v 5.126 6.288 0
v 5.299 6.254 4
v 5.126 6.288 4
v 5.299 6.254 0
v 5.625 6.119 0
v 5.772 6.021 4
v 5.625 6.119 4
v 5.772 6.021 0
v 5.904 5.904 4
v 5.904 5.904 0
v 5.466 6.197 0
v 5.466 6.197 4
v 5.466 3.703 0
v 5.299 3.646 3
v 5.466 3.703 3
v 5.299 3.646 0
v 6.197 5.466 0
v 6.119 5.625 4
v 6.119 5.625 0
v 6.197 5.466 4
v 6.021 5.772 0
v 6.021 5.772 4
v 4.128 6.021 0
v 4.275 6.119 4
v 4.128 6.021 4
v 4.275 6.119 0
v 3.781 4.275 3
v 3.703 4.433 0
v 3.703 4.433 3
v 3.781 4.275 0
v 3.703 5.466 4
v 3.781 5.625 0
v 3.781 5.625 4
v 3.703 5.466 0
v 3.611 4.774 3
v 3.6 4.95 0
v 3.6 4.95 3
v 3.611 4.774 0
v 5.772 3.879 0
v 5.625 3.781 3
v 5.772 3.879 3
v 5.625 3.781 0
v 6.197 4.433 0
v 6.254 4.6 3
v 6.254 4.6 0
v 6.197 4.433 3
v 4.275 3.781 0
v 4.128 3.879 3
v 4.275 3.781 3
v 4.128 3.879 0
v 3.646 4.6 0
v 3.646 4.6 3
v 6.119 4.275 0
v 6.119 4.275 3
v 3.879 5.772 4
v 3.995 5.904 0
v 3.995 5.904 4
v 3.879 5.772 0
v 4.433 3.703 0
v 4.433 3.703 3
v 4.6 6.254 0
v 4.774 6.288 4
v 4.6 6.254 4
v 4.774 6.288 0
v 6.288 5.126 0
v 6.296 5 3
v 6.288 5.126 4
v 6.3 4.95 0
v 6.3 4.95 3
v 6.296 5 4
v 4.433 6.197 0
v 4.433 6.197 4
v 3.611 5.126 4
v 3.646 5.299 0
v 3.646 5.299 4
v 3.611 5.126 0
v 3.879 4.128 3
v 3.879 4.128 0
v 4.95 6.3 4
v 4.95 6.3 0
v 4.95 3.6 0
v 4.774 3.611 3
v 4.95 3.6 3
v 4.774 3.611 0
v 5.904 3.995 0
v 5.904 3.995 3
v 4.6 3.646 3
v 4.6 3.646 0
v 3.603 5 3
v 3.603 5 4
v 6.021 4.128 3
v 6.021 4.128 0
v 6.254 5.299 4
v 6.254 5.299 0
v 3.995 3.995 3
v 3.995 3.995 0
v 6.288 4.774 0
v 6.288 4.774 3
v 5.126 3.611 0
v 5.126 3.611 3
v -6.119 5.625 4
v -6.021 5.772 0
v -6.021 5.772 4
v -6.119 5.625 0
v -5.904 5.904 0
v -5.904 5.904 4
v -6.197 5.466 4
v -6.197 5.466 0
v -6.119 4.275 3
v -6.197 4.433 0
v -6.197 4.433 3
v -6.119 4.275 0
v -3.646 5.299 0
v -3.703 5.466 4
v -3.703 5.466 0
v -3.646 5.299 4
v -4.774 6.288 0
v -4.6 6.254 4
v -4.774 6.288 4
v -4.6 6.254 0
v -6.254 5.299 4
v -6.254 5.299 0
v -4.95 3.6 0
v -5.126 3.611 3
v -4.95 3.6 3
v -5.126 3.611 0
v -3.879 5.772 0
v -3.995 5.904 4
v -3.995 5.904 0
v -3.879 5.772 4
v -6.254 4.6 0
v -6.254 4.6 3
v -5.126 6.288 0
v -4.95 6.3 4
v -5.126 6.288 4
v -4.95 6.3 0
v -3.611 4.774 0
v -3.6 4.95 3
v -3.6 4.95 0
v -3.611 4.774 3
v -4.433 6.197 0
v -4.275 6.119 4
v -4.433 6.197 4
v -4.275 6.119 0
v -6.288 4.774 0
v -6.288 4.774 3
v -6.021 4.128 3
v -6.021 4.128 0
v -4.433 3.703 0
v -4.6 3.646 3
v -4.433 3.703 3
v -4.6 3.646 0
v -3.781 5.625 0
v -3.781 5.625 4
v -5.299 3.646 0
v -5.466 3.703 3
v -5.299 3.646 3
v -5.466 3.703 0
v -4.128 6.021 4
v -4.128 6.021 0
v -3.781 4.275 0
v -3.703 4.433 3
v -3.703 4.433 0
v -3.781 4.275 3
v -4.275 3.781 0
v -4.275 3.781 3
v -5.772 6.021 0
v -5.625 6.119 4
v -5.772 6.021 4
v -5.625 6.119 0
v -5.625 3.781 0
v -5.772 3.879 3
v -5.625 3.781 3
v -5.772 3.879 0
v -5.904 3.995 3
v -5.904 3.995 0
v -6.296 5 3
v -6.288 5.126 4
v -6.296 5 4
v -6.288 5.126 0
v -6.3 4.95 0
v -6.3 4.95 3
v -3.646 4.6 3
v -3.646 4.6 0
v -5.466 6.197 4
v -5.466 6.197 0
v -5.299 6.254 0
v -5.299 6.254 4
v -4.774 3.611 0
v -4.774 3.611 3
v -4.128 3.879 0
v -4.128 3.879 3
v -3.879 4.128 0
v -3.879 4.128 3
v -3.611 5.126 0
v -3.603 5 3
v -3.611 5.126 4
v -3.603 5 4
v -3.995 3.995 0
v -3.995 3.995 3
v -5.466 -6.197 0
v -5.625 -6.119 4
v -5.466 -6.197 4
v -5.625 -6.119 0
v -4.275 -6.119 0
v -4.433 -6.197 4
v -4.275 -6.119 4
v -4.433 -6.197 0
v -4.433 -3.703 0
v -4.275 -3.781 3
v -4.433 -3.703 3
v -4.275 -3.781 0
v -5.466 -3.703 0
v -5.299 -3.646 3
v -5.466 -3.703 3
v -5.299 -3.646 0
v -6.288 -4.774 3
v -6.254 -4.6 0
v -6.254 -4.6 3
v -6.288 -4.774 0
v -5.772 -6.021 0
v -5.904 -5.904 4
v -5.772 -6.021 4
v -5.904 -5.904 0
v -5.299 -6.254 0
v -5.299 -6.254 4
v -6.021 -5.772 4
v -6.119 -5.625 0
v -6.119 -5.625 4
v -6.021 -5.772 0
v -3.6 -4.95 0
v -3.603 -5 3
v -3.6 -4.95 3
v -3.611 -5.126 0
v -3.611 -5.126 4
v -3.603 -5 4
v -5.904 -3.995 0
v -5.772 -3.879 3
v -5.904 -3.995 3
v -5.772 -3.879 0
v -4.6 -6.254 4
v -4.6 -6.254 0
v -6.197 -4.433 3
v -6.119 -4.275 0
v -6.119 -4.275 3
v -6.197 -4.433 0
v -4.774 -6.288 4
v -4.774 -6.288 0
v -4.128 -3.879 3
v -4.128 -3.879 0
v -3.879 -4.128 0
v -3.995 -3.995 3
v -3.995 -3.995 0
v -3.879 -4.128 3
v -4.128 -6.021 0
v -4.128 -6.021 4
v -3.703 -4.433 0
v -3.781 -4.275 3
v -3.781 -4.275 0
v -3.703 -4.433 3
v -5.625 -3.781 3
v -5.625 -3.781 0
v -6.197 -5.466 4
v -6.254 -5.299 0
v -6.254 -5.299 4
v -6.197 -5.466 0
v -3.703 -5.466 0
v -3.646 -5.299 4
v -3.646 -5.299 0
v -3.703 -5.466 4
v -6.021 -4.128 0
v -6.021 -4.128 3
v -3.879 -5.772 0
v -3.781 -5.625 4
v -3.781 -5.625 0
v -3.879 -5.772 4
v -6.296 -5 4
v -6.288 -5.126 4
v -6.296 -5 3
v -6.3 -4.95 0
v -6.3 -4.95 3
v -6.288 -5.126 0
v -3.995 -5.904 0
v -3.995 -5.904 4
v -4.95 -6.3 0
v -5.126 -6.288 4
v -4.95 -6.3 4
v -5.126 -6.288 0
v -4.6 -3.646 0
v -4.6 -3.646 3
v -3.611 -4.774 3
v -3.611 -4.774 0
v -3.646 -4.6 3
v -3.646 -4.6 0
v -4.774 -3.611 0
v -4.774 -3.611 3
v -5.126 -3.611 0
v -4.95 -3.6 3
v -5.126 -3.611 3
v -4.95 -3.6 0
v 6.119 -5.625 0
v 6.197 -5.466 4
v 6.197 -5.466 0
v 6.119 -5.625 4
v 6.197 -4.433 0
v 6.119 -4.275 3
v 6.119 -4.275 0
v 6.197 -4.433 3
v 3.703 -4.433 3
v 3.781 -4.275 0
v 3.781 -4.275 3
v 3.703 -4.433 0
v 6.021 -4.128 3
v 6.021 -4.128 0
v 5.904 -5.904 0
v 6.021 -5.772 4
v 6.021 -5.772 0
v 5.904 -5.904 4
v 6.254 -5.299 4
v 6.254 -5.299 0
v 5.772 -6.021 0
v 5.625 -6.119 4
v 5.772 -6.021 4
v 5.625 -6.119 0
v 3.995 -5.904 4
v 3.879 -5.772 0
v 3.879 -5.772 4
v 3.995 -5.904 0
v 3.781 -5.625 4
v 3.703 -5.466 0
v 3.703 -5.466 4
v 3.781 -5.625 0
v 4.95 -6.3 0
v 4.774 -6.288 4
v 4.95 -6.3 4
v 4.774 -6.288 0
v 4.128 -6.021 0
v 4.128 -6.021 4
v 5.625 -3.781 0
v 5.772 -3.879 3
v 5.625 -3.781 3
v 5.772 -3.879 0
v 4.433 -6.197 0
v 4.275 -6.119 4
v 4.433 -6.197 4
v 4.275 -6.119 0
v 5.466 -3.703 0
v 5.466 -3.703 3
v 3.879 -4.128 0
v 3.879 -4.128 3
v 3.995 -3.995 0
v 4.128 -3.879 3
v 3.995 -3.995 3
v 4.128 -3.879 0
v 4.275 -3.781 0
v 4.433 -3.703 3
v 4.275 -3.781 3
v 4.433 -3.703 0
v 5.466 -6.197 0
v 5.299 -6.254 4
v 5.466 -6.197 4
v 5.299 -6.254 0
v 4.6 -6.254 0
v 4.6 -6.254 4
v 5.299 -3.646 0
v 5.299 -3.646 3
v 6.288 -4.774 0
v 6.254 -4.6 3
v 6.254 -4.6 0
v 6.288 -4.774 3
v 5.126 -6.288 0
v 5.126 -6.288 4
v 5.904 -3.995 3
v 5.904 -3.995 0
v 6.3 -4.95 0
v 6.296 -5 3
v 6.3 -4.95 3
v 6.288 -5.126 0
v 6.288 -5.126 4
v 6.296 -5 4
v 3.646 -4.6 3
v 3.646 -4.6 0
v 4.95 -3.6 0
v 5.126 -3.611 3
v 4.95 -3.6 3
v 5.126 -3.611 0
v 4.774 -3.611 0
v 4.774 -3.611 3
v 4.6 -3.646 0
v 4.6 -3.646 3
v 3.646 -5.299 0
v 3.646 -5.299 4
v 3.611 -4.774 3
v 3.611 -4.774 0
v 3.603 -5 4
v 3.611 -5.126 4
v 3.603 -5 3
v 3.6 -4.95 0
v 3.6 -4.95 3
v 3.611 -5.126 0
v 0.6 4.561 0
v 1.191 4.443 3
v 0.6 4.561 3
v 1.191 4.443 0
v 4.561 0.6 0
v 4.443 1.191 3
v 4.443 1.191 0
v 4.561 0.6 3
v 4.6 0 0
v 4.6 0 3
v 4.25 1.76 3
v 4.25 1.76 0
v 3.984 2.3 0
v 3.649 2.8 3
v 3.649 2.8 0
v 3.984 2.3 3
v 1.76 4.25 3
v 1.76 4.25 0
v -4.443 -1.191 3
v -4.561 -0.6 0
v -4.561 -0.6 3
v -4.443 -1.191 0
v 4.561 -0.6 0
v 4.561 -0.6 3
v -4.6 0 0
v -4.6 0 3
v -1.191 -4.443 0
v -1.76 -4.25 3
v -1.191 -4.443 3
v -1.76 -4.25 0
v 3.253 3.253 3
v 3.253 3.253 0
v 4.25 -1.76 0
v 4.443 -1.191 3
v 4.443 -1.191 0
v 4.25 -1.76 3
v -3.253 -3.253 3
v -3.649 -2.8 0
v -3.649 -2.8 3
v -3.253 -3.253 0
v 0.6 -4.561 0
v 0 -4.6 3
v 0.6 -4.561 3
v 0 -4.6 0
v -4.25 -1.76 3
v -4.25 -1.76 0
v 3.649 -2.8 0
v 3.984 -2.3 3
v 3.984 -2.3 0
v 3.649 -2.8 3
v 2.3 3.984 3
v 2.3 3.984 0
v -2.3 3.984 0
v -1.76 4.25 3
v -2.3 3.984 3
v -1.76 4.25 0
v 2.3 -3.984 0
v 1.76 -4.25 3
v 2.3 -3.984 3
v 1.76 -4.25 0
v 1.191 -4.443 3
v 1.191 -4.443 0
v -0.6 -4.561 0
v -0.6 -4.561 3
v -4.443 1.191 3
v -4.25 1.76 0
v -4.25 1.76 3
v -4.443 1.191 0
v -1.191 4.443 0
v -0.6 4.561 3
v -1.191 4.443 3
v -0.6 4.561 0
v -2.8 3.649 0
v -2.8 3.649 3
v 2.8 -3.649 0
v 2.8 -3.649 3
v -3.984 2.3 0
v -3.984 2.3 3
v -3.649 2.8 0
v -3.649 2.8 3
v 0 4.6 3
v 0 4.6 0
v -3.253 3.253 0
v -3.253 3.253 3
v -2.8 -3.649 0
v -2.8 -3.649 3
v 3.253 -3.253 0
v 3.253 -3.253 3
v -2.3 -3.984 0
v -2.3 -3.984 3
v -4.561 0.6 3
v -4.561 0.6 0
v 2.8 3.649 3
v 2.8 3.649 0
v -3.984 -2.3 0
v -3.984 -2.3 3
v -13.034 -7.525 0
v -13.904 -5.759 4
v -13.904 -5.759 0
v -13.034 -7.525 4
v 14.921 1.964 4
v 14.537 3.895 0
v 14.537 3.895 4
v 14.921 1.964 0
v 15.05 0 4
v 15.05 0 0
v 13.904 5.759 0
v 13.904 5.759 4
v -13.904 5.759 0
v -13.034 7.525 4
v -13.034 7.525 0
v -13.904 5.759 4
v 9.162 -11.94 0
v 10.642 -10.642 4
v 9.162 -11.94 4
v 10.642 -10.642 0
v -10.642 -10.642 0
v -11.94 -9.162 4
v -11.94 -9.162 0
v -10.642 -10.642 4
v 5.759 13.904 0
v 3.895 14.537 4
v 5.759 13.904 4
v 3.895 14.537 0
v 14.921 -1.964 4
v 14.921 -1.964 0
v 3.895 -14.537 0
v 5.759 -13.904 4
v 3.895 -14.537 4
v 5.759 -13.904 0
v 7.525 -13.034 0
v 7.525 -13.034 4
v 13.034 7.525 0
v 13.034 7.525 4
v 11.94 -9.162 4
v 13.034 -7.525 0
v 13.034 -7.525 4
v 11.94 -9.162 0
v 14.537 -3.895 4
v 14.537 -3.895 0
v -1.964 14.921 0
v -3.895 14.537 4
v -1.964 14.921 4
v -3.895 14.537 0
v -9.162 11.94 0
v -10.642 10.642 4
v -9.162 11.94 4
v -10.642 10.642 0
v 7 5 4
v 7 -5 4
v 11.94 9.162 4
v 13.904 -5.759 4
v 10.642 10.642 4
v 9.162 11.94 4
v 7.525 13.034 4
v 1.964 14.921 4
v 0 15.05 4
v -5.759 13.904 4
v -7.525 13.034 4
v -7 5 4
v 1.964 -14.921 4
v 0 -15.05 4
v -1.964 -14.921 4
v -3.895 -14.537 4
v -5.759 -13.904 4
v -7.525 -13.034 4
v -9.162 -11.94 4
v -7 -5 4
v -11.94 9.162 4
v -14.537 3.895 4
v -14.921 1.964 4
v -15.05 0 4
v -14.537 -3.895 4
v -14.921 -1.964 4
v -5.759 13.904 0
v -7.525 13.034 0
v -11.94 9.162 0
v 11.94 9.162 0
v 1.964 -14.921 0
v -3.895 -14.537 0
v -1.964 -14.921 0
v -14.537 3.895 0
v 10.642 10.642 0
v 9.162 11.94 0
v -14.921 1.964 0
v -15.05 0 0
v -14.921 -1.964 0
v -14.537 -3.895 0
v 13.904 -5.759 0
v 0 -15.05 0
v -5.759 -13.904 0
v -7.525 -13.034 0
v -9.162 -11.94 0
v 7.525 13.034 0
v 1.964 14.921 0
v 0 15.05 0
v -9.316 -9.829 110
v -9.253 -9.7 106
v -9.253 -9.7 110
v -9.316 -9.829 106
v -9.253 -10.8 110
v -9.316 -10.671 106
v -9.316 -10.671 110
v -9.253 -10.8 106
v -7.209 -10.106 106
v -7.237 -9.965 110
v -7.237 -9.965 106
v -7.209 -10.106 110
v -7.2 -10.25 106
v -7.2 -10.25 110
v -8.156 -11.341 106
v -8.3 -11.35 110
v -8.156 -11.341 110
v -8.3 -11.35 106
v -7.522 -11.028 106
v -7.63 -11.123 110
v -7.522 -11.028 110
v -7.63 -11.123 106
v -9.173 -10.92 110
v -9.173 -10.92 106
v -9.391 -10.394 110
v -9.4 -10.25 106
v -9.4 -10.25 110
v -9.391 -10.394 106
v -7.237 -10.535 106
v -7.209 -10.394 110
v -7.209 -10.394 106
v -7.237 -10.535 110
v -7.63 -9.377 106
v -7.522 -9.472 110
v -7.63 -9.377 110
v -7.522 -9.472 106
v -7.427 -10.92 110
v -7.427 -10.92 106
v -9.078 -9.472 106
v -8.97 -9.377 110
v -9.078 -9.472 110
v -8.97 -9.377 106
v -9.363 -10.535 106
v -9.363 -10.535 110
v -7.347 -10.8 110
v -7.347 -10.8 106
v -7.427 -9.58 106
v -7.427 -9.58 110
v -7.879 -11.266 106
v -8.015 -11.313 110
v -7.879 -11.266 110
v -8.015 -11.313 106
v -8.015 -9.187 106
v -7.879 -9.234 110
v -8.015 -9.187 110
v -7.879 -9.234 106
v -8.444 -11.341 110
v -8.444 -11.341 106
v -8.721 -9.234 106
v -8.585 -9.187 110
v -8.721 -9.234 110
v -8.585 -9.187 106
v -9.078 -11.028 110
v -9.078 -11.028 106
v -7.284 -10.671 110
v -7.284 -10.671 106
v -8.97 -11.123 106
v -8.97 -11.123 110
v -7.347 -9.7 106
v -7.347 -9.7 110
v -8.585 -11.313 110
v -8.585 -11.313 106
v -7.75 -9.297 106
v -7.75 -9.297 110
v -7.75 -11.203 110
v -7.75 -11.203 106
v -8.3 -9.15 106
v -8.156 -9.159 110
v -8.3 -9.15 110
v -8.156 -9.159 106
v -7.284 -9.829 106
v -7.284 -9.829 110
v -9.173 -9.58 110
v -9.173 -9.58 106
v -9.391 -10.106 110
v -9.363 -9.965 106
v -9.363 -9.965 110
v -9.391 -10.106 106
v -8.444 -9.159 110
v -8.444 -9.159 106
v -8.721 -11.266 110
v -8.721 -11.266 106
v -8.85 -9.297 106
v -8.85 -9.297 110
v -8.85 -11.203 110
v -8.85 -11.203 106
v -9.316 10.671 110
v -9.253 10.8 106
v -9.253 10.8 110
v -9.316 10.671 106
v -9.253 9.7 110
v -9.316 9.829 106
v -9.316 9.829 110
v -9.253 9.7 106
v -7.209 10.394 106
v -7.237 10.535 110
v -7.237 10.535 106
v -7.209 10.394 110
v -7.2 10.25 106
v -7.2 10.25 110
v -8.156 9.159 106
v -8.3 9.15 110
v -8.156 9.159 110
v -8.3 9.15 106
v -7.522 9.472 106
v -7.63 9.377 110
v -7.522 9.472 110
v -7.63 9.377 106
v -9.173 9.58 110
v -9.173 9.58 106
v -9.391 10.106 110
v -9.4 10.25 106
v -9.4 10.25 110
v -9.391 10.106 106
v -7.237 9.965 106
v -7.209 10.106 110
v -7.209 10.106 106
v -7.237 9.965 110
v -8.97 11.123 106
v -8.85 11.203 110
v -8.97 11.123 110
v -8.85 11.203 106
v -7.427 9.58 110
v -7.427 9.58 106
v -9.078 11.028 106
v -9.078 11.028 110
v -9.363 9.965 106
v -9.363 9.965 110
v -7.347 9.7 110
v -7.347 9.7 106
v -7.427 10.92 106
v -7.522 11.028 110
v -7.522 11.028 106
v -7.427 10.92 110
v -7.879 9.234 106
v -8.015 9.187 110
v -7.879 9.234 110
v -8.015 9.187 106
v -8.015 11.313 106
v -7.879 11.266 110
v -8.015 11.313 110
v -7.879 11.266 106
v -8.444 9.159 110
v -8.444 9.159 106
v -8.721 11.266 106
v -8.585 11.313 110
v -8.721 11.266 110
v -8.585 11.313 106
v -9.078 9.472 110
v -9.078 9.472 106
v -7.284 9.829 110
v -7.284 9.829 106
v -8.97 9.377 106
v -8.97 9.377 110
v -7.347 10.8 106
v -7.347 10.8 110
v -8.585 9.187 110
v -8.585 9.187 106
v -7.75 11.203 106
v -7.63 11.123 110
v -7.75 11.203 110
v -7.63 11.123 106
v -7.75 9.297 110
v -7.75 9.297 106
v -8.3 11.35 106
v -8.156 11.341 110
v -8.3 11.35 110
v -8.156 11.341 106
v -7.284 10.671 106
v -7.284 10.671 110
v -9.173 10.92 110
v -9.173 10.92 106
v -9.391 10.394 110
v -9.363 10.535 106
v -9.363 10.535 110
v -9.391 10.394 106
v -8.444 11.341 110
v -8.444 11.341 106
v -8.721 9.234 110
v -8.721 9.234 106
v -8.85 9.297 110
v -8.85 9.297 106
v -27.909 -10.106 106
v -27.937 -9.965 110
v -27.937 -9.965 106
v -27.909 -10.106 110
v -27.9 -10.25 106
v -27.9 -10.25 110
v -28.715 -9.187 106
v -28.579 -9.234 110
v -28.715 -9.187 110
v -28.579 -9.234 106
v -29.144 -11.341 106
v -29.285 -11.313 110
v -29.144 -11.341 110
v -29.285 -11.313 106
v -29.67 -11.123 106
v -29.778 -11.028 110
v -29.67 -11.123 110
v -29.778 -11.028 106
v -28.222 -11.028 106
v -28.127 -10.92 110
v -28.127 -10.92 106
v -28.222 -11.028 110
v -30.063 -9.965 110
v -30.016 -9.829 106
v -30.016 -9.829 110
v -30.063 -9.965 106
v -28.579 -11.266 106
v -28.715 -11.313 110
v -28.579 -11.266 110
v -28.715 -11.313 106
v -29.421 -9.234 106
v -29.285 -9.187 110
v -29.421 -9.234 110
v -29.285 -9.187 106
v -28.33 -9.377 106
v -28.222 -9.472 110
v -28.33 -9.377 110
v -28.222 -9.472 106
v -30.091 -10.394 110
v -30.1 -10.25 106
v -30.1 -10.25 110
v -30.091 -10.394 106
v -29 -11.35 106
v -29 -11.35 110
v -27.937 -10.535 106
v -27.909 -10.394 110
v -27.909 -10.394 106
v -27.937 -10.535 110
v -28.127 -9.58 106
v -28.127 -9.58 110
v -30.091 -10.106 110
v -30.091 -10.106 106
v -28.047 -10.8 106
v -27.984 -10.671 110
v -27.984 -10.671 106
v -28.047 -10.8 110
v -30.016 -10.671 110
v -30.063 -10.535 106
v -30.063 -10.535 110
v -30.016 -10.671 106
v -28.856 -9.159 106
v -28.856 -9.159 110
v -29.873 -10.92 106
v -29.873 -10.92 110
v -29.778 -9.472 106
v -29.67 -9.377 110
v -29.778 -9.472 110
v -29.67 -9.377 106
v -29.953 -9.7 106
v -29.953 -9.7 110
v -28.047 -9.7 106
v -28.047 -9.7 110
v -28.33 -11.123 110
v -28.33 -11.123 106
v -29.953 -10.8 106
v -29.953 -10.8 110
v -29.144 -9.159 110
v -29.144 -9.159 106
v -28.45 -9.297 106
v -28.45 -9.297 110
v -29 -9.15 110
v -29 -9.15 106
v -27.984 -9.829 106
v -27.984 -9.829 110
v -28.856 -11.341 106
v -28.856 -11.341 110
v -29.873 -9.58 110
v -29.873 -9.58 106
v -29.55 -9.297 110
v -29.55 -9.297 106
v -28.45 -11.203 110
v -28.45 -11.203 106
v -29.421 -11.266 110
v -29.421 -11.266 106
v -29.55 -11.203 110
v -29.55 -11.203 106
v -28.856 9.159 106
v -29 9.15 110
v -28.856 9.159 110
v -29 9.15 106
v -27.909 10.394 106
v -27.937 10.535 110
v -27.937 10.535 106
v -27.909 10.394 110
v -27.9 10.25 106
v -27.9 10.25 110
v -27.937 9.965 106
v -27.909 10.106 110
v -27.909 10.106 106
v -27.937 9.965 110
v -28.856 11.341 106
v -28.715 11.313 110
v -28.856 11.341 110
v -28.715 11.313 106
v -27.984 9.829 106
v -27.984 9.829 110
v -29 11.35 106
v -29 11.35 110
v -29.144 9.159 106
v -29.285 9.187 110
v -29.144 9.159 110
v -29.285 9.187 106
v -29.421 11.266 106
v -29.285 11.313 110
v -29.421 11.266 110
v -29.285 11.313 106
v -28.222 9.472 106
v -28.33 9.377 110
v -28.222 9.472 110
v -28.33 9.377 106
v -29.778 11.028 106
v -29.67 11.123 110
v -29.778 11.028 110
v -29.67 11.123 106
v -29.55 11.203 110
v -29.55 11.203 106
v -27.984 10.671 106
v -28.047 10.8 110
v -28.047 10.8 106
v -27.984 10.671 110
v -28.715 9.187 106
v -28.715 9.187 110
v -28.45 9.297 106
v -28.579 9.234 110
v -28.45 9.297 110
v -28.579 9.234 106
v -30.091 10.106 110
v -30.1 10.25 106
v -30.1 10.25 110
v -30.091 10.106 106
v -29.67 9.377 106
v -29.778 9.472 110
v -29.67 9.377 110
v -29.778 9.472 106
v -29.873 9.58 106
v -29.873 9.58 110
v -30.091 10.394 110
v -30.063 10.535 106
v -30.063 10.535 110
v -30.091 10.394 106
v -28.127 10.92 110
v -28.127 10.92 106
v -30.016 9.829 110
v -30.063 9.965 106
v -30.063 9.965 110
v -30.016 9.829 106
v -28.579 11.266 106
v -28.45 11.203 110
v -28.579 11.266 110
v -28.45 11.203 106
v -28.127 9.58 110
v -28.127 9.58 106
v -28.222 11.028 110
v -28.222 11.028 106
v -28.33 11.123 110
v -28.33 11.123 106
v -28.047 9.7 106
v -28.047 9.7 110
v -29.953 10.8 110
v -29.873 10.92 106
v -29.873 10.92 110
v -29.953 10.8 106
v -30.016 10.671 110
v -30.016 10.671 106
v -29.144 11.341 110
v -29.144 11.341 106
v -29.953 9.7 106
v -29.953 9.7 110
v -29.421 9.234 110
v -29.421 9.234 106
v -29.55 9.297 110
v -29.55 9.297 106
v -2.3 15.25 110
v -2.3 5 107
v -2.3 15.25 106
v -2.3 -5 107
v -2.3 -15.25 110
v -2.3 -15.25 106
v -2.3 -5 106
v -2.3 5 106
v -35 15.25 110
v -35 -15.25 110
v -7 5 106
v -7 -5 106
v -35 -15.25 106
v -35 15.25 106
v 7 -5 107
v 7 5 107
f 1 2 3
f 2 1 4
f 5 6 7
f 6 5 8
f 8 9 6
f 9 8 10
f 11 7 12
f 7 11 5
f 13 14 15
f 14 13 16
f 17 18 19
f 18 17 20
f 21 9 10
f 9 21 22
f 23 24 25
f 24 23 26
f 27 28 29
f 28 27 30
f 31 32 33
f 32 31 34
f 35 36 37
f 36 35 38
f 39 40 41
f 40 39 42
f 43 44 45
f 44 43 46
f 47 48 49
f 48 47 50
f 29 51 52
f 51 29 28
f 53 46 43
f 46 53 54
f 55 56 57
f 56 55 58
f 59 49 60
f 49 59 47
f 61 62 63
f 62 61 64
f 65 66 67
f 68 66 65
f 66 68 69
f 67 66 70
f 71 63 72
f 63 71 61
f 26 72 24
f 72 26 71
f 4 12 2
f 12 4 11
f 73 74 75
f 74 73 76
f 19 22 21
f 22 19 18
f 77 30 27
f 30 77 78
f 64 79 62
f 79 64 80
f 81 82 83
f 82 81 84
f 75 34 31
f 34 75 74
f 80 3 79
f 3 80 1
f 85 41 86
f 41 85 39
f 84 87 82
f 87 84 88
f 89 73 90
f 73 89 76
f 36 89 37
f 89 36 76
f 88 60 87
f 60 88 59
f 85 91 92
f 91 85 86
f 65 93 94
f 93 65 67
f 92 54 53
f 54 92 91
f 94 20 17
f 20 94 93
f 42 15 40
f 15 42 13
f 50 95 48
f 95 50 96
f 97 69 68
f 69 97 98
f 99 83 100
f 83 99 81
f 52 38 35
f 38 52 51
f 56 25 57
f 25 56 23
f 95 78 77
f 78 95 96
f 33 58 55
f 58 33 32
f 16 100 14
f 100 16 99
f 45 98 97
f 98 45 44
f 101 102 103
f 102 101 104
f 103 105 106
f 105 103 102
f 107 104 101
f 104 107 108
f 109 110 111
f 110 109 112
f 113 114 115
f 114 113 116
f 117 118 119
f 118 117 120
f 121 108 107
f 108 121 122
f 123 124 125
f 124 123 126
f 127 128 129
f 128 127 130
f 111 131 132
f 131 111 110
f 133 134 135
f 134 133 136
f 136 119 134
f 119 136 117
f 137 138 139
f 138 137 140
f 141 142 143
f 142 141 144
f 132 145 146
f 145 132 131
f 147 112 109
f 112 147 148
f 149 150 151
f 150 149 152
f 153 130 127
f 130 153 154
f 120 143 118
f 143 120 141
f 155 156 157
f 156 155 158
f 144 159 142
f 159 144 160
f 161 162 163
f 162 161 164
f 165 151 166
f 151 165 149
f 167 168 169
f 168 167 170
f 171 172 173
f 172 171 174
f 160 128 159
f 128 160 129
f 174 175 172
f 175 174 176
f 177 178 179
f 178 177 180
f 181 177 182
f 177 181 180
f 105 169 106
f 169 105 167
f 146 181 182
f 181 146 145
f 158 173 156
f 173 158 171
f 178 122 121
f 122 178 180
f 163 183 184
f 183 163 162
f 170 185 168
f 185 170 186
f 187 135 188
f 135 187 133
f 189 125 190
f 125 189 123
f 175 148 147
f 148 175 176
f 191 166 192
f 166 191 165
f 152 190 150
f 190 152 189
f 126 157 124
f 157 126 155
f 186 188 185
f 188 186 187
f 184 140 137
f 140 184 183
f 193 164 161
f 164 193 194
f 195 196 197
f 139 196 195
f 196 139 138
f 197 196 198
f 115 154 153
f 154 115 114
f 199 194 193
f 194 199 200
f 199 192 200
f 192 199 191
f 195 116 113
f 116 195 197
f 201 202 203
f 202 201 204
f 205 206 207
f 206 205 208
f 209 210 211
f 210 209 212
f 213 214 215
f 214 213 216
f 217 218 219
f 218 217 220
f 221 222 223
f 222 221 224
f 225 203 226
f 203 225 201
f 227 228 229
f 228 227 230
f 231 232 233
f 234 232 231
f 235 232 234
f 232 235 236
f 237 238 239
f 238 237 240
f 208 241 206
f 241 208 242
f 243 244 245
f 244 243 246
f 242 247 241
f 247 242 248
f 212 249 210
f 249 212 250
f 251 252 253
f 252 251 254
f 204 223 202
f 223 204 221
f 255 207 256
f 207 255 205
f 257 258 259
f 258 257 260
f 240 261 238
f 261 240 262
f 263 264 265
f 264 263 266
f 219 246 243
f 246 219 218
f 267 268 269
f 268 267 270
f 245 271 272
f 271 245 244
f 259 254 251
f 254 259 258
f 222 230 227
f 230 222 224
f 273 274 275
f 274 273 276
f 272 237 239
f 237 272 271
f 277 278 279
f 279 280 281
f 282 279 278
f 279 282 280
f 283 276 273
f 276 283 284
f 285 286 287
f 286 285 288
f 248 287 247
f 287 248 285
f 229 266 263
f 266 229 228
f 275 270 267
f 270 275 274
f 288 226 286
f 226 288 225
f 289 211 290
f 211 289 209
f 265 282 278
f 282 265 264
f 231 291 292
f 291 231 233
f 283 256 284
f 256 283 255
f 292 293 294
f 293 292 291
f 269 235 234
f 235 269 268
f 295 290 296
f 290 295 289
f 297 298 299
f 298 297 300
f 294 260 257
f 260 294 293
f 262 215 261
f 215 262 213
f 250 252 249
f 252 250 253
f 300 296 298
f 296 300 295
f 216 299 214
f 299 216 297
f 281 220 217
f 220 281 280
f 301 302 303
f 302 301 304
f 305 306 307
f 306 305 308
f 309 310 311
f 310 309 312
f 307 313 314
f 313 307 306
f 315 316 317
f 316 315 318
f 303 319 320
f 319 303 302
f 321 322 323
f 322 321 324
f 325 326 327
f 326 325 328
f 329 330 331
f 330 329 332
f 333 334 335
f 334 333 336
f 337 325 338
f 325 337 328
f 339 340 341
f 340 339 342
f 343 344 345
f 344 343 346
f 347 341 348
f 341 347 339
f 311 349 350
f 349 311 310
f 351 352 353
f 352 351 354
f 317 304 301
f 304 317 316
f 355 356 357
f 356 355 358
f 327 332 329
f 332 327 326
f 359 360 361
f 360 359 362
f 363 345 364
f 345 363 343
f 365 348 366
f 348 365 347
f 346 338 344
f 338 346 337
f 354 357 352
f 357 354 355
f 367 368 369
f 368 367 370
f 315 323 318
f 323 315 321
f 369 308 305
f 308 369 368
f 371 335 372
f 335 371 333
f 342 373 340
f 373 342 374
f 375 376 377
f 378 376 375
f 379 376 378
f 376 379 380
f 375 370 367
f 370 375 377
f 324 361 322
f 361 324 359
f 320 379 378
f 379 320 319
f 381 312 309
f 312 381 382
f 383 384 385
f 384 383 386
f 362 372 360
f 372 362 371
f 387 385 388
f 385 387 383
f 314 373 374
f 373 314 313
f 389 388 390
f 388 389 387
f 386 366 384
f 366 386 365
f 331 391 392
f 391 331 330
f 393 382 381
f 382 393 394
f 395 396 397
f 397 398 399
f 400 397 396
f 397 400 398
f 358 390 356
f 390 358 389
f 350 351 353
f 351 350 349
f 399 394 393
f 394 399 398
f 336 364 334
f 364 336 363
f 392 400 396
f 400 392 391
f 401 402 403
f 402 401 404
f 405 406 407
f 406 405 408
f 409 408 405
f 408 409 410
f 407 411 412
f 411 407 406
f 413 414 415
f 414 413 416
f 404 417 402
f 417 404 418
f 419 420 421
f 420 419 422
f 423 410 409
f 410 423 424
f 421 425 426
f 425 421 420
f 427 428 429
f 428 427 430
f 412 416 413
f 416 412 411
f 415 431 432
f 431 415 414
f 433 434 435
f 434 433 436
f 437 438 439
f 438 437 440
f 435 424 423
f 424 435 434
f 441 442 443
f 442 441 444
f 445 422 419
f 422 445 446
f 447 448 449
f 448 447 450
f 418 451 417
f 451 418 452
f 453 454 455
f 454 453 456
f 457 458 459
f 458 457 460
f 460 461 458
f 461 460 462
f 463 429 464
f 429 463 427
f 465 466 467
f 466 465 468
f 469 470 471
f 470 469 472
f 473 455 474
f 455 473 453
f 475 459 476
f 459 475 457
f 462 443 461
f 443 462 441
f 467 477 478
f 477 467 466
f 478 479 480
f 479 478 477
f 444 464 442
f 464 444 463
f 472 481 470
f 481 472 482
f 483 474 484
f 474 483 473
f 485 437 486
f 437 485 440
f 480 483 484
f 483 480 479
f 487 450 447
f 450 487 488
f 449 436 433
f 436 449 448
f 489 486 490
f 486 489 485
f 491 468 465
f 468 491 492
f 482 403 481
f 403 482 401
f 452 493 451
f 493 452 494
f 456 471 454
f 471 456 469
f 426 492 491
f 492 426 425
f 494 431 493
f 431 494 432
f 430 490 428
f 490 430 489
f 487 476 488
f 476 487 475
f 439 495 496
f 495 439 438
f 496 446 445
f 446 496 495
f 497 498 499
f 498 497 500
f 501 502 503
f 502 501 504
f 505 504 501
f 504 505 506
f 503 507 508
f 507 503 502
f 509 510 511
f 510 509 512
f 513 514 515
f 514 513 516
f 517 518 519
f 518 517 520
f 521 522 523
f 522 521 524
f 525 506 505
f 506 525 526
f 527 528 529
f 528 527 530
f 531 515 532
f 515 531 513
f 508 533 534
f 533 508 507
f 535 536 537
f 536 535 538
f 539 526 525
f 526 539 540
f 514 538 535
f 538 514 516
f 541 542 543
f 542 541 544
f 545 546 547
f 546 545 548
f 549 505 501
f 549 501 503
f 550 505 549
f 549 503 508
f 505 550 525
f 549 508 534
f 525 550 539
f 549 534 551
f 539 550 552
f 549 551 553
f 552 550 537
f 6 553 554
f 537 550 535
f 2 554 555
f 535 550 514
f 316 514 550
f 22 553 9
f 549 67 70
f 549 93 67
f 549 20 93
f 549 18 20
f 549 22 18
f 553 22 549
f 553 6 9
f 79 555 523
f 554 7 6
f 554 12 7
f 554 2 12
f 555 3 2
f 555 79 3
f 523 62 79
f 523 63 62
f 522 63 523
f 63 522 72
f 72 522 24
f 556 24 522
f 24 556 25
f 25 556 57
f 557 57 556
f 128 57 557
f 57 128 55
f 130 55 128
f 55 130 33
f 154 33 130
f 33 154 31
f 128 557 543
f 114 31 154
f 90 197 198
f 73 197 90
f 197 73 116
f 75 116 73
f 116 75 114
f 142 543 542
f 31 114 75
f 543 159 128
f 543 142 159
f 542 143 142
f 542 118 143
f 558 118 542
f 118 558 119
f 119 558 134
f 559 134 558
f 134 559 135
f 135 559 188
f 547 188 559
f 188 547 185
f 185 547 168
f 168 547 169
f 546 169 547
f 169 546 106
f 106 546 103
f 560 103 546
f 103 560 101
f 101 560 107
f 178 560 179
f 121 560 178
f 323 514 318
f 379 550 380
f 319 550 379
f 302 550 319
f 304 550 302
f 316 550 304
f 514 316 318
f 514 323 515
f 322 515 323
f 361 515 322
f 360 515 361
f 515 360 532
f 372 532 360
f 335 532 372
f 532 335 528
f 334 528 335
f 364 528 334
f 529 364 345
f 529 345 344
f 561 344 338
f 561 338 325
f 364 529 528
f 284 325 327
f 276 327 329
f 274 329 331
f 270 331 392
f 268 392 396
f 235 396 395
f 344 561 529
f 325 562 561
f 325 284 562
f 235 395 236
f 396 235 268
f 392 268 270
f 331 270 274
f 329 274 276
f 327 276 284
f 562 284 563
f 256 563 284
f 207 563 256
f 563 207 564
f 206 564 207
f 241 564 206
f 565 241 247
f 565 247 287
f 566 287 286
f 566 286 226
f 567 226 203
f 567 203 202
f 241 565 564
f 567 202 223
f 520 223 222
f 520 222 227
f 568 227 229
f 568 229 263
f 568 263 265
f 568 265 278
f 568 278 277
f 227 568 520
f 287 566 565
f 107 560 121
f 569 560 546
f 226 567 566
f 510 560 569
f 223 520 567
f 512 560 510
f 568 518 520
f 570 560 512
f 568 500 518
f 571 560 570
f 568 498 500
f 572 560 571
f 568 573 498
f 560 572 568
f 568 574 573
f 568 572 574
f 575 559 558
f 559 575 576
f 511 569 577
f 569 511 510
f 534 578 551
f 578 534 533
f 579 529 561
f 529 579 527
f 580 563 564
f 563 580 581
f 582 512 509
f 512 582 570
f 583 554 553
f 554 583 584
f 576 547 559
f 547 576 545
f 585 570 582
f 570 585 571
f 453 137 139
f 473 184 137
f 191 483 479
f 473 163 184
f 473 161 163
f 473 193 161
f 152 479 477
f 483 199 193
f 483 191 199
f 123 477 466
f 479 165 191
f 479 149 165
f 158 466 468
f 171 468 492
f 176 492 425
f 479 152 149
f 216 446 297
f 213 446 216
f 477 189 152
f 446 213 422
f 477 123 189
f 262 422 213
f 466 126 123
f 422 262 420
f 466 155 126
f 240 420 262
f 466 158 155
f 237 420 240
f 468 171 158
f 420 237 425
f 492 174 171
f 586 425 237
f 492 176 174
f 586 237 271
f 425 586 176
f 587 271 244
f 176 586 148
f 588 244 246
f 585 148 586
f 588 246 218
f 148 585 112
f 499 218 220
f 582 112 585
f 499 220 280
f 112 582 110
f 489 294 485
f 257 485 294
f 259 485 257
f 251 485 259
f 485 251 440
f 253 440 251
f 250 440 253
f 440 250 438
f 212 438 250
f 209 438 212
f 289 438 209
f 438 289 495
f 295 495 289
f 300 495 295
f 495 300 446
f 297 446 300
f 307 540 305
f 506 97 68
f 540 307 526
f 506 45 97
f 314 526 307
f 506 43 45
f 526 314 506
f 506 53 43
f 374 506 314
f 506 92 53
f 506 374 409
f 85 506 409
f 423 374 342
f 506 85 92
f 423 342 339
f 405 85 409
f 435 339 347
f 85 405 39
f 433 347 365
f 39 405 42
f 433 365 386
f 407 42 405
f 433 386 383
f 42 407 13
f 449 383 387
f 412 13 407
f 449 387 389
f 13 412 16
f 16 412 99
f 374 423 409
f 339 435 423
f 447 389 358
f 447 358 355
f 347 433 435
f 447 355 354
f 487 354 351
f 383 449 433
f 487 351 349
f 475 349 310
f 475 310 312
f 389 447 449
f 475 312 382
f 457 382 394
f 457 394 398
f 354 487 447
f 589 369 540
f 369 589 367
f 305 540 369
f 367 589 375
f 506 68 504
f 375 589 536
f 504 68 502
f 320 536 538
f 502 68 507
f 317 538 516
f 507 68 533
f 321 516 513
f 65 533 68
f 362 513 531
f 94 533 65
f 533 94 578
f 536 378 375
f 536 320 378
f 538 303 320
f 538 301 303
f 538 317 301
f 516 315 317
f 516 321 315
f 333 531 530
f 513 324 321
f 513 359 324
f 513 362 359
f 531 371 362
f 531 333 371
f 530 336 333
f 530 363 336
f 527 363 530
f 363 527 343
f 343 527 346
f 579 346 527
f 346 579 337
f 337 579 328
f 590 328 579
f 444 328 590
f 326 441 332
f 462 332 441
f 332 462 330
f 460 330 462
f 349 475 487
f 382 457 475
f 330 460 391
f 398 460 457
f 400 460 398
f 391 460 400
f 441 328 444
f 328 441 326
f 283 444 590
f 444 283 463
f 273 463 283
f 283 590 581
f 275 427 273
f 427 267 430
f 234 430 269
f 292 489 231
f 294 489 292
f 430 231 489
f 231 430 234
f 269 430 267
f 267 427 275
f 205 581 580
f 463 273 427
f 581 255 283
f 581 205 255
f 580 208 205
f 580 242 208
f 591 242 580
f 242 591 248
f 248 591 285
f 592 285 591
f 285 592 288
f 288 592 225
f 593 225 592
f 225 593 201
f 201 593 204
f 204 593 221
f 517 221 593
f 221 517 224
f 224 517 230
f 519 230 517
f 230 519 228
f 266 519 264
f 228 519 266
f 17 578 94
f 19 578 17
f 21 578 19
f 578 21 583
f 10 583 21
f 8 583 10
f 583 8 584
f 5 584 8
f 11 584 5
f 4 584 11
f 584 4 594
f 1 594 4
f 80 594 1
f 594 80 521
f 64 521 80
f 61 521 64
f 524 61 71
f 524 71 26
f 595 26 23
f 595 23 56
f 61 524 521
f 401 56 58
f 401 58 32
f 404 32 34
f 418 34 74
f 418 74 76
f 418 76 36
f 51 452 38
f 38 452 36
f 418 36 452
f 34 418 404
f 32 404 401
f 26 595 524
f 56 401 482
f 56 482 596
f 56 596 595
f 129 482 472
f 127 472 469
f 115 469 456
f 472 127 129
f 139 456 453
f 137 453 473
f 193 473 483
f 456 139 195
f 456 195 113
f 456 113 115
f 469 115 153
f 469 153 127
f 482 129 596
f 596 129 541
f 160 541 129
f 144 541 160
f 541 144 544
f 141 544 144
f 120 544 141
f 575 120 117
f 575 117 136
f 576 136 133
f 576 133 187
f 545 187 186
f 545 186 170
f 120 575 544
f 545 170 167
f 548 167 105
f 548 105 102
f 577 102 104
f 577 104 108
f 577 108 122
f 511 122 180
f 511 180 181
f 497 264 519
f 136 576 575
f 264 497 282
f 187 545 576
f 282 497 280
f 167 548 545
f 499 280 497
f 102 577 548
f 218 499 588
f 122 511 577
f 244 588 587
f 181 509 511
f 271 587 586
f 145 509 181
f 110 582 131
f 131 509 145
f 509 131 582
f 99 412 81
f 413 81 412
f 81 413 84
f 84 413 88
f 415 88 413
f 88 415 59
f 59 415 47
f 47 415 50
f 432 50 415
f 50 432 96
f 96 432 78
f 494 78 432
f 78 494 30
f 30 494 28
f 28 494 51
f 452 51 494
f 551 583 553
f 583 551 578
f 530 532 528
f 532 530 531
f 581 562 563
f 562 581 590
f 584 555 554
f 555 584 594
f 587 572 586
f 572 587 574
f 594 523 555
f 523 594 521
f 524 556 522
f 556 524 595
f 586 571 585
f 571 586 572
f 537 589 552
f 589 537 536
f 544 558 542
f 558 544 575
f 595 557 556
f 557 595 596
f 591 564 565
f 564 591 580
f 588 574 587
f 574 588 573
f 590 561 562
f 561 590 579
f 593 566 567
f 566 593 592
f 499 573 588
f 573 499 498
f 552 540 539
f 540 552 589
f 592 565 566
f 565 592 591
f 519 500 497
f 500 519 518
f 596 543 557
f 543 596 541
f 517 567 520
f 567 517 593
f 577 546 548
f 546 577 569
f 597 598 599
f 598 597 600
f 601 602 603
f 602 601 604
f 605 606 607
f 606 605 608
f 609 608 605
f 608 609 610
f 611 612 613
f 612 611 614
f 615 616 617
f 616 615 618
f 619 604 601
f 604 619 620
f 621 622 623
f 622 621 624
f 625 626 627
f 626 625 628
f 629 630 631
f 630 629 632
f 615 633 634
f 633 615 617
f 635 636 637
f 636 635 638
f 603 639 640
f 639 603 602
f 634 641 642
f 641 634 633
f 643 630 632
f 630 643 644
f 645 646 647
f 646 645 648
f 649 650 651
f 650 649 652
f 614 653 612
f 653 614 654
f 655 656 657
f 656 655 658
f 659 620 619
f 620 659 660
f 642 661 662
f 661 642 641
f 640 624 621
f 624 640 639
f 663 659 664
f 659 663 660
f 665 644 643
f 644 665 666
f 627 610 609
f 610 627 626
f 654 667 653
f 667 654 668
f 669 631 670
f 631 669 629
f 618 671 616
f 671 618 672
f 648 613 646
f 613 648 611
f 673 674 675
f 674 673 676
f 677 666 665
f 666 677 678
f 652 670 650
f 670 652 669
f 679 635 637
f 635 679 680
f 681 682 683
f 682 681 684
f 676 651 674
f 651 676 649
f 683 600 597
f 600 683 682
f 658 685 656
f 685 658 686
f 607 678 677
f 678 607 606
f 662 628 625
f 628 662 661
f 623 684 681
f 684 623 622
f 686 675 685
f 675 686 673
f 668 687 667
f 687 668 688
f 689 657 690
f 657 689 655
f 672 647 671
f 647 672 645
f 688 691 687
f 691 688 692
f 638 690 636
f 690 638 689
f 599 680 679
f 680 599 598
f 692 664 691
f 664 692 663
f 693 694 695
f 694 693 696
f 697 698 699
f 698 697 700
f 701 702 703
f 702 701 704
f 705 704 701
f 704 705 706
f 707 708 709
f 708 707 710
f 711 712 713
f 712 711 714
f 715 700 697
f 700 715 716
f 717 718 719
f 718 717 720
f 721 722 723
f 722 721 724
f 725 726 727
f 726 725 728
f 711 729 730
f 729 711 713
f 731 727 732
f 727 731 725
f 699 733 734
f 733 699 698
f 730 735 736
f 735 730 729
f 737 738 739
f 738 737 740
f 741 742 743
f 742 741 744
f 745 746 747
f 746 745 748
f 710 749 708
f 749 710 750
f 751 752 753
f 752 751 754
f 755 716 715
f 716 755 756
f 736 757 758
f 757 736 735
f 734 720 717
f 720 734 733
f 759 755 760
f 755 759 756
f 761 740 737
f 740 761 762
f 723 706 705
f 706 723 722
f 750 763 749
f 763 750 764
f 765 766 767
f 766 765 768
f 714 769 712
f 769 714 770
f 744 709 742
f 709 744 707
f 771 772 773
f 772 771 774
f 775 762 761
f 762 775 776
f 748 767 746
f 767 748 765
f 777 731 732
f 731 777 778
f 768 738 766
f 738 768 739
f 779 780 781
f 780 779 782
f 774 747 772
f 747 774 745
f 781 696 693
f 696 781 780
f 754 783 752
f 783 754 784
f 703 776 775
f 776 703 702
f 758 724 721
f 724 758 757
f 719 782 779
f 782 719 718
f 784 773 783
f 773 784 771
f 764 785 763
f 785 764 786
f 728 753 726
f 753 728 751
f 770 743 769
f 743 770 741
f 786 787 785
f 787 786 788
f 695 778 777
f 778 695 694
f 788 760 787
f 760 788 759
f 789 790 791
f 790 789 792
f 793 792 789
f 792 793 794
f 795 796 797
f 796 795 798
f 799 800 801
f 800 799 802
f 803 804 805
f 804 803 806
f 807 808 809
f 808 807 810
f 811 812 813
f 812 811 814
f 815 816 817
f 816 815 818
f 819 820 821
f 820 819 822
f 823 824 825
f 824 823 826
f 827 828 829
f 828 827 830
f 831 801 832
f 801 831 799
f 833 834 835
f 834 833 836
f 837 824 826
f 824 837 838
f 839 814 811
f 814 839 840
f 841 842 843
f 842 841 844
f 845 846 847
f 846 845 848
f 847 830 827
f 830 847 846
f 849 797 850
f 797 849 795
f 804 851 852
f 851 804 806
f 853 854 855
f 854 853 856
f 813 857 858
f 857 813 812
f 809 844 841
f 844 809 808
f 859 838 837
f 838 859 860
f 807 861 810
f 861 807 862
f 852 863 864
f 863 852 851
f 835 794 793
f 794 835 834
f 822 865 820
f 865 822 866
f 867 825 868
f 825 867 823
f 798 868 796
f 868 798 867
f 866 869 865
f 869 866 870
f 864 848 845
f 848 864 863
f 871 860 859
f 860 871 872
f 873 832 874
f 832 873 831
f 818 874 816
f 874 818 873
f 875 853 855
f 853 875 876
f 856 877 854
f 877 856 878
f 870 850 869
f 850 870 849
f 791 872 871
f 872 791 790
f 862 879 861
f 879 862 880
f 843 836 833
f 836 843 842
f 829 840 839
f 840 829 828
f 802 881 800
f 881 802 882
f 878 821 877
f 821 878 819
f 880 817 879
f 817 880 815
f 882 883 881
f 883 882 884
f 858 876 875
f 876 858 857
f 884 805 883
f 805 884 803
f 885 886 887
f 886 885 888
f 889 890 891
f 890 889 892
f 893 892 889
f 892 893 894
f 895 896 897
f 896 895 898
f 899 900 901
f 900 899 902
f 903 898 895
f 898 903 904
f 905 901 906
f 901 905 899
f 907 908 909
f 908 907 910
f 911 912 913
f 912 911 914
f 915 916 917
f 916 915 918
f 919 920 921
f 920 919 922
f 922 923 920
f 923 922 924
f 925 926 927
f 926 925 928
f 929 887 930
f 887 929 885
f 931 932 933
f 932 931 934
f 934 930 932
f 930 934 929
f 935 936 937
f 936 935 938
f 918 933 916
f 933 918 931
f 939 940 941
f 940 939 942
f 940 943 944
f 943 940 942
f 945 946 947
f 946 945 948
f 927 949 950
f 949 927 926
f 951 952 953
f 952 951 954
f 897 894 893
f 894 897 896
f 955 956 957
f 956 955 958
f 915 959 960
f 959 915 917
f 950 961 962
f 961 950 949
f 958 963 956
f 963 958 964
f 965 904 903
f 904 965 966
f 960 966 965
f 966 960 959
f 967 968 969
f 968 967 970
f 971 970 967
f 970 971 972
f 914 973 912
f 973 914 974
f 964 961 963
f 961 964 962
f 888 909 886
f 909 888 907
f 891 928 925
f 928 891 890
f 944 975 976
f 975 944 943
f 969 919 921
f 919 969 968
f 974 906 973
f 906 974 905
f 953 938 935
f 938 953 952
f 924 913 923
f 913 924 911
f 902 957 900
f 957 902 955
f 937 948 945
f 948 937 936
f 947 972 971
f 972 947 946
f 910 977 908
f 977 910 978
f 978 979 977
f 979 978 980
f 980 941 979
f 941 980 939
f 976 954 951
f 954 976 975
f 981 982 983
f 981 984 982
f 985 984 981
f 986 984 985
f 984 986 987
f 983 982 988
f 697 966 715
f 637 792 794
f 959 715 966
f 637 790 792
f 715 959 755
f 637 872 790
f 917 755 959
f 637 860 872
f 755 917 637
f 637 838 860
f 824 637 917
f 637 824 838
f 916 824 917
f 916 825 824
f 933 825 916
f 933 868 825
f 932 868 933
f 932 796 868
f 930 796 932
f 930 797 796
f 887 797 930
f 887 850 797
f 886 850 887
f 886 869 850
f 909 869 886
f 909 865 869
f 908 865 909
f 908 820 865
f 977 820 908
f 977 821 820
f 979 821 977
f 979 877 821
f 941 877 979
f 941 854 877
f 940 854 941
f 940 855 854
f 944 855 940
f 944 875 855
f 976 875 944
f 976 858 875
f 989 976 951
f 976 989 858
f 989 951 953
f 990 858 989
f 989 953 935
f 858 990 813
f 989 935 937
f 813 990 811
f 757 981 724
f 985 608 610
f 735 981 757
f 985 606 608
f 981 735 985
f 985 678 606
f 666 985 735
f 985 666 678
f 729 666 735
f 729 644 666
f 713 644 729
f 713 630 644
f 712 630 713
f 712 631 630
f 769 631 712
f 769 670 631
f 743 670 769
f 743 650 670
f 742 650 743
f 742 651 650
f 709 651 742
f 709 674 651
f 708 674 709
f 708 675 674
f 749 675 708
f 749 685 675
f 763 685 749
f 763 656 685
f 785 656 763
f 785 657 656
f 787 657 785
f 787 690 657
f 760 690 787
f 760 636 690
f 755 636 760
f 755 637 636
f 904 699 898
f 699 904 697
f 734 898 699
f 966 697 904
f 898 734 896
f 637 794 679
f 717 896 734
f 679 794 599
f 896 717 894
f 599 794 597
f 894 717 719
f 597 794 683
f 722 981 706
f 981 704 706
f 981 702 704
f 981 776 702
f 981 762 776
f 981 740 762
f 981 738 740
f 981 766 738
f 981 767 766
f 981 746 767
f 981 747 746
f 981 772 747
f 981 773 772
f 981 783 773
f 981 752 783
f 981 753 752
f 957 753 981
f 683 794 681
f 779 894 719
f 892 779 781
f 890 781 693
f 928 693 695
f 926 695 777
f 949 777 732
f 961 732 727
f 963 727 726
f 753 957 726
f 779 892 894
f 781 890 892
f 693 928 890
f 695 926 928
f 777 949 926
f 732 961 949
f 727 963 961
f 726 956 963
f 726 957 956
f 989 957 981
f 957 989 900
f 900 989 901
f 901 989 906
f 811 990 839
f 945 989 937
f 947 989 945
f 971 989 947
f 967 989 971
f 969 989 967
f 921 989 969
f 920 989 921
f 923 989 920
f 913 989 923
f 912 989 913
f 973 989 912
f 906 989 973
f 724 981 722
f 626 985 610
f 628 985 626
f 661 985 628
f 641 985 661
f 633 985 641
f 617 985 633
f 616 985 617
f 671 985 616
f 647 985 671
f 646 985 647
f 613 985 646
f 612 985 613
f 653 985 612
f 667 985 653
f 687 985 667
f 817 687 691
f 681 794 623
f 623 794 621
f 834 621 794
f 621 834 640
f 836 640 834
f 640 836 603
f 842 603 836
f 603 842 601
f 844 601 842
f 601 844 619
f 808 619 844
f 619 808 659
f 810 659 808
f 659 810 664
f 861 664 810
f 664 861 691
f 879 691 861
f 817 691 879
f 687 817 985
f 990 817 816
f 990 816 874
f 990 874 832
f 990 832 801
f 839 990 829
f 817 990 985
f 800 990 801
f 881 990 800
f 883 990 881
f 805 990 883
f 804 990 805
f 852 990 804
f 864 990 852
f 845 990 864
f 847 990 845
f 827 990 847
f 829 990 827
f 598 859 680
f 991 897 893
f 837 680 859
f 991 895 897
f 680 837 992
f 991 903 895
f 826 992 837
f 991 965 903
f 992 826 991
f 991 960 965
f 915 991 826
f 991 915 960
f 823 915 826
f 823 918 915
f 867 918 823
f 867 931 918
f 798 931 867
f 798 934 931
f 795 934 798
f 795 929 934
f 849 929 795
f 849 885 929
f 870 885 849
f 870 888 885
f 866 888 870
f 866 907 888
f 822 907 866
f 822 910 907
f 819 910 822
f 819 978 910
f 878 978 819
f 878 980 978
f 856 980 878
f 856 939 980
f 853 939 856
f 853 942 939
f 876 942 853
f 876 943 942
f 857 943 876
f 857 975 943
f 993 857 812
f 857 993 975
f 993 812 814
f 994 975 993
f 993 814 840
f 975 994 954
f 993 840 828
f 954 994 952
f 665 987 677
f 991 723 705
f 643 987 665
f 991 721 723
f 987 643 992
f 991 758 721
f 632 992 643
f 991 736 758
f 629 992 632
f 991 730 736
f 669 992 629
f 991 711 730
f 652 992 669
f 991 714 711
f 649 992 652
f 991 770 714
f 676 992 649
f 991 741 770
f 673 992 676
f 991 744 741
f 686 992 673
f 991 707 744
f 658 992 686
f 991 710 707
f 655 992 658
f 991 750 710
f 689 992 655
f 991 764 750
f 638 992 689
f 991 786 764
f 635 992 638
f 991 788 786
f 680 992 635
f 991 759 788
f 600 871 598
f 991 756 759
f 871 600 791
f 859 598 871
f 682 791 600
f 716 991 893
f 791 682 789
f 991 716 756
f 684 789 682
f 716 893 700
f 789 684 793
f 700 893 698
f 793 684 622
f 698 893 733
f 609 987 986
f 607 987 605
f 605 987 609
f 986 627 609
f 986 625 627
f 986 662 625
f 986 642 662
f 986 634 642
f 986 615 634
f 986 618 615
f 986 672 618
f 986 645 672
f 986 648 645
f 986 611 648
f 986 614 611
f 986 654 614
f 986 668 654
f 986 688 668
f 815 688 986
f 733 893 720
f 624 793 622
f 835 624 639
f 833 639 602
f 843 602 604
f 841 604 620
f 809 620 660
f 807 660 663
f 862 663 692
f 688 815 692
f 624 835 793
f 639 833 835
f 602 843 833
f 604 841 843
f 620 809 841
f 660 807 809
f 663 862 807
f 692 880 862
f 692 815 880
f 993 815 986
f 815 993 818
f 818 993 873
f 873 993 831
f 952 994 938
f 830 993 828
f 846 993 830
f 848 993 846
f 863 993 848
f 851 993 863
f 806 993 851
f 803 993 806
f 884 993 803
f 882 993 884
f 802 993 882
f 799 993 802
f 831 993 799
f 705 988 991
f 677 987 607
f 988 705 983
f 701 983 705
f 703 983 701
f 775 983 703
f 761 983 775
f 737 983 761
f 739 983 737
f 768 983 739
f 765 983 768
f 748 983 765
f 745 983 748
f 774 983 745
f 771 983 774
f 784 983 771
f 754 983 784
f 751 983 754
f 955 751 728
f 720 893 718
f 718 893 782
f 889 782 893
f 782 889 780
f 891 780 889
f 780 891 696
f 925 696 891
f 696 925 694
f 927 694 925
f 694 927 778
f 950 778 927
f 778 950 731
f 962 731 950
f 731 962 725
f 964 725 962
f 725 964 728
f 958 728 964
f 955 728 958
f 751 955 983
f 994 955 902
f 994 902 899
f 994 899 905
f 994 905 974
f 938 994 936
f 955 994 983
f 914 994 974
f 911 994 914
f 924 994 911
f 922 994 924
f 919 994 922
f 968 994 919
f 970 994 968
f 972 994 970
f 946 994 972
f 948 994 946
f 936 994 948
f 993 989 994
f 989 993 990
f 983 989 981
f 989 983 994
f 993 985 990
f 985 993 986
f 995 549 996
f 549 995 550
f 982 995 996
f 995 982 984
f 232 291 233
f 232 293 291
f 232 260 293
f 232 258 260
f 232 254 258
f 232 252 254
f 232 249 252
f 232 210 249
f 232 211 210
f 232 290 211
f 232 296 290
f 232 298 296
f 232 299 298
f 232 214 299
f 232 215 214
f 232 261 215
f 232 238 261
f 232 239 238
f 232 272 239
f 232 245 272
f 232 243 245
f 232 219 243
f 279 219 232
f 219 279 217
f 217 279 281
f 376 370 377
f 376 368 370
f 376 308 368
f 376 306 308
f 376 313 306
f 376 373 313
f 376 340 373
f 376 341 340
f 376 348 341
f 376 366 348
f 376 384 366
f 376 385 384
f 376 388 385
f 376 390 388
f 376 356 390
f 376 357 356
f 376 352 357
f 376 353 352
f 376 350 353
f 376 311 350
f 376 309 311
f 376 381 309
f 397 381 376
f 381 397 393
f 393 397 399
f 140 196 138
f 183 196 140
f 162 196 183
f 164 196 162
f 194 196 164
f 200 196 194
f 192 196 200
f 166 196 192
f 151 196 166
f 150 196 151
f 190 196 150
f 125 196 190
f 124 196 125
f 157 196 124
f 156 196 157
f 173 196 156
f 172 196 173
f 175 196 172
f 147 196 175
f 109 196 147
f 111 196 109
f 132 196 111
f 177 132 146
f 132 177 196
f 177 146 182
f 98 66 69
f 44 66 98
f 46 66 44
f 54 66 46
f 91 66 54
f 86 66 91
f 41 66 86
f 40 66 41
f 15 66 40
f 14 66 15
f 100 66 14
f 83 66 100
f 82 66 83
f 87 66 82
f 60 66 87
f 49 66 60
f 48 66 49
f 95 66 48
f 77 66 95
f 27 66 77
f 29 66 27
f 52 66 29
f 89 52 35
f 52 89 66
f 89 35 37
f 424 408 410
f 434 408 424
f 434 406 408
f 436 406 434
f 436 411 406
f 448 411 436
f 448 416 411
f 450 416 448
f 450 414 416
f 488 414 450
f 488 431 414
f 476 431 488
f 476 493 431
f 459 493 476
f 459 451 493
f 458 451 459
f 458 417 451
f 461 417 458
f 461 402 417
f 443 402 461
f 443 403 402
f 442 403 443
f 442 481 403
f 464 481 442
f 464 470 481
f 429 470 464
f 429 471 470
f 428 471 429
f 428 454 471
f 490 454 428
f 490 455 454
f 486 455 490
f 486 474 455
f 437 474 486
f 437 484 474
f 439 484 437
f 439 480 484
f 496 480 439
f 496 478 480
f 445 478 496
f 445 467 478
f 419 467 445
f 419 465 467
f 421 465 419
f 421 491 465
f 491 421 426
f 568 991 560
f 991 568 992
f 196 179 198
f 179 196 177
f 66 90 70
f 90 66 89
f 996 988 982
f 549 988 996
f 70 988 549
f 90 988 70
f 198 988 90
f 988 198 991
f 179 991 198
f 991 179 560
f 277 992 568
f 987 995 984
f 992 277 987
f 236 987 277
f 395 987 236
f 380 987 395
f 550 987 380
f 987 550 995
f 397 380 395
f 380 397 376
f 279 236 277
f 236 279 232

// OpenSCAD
// file: helpers.scad
// Shared building blocks. Convention: every part's own joint-to-joint axis
// is local Z, so end plates are naturally perpendicular to it and holes bore
// straight along Z. Whole parts get rotated into the world only when placed
// into an assembly view - never inside a single part's own file.
include <params.scad>

// A boss with a heat-set-insert bore, sized to sit inside a wall.
module insert_boss(h) {
    difference() {
        cylinder(d = insert_d + wall, h = h);
        translate([0, 0, h - insert_depth])
            cylinder(d = insert_d, h = insert_depth + 0.1);
    }
}

// Four insert bosses in a rectangle, base sitting on z=0.
module bolt_pattern(x, y, h) {
    for (sx = [-1, 1]) for (sy = [-1, 1])
        translate([sx * x / 2, sy * y / 2, 0]) insert_boss(h);
}

// Clearance holes through a slab of thickness h, for the mating part.
module bolt_holes(x, y, d, h) {
    for (sx = [-1, 1]) for (sy = [-1, 1])
        translate([sx * x / 2, sy * y / 2, -0.1]) cylinder(d = d, h = h + 0.2);
}

// Horn-side bolt circle, holes along Z, through a slab of thickness h.
// MEASURED: four holes on one circle of radius 7.0, at 45/135/225/315 - see
// measure/README.md. The central bore clears the horn's own hub.
module horn_bolt_circle(h) {
    for (a = [45, 135, 225, 315]) rotate([0, 0, a])
        translate([horn_bolt_r, 0, -0.1]) cylinder(d = horn_bolt_d, h = h + 0.2);
    translate([0, 0, -0.1]) cylinder(d = horn_hub_d, h = h + 0.2);
}

// A round plate carrying the horn bolt circle, face normal along Z, sitting
// at z=[0,h]. This is what a leg segment bolts to a servo's rotating horn.
// Diameter clears the servo's own raised collar so the plate seats on the
// horn, not on the case.
module horn_plate(h) {
    difference() {
        cylinder(d = servo_boss_d + 2 * wall, h = h);
        horn_bolt_circle(h);
    }
}

// A plate that bolts to the servo's CASE, using the four case screws. The
// servo's own axis sits at x=0 here, so this plate lines up with horn_plate
// on the other side of the joint. Screws go in along Z.
// MEASURED positions - see measure/README.md.
module case_plate(h) {
    xs = [for (x = case_screw_x_used) x - servo_axis_x];
    difference() {
        translate([min(xs) - 6, -case_screw_y - 5, 0])
            cube([max(xs) - min(xs) + 12, 2 * case_screw_y + 10, h]);
        for (x = xs) for (sy = [-1, 1])
            translate([x, sy * case_screw_y, -0.1])
                cylinder(d = case_screw_d, h = h + 0.2);
    }
}

// The ST3215 body pocket: servo drops in from the open top, its case (not
// the gearbox) bearing on the lip. Origin is the servo's OUTPUT AXIS, not
// the case centre, so a pocket lines up with the joint it drives.
module servo_pocket(depth) {
    l = servo_l + 2 * servo_fit;
    w = servo_w + 2 * servo_fit;
    translate([-servo_axis_x - l / 2, -w / 2, 0]) cube([l, w, depth + 0.1]);
}
// file: params.scad
// ==================== source of truth ====================
// Every number below is cross-referenced to either this repo's own simulation
// model (src/robot_cat_description/urdf/cat.urdf.xacro at scale 1.0, and
// robot_cat_gait/leg_ik.py) or to a measurement of a real CAD file - see
// hardware/cad/measure/README.md for the method, the sources and the raw
// numbers.
//
// Nothing here is a guess any more. The two values that used to be flagged
// ADJUSTABLE (the horn bolt circle and a downloaded bracket's flange) were
// replaced by measurements taken off the official STS3215 STEP model, so the
// downloaded bracket is no longer on the critical path at all.

// ---- leg geometry - VERIFIED, must match leg_ik.py exactly ----
thigh_length = 110;   // LegGeometry.thigh_length, axis to axis
calf_length  = 110;   // LegGeometry.calf_length, axis to paw centre
hip_offset   = 25;    // hip roll axis -> thigh pitch axis, lateral
foot_radius  = 12;    // paw pad sphere radius

// ---- trunk geometry - VERIFIED ----
hip_x = 110;          // hip mount, x from body centre (so 220mm hip-to-hip)
hip_y = 55;           // hip mount, y from body centre (so 110mm hip-to-hip)
body_length = 300;
body_width  = 111;
body_height = 141;

// ---- ST3215 / STS3215 servo - MEASURED from the official CAD model
// (TheRobotStudio/SO-ARM100, STEP/SO100/STS3215_03a.step). The shop pages'
// "45.2 x 24.7 x 35" is the CASE only; the model bounding box is 39.6 deep
// because the output boss and the idler boss stand proud of it. Pocket depth
// must use servo_h, clearance above it must allow for servo_boss. ----
servo_l = 45.4;
servo_w = 24.8;
servo_h = 35.4;        // case alone, faces at +/-17.7 from centre
servo_boss_h = 2.3;    // output boss above the case face
servo_boss_d = 22.1;   // raised collar around the output axis, +0.1 clearance
servo_axis_x = 12.5;   // output axis offset from the servo's own centre,
                       // i.e. 10.2mm in from the near end face
servo_fit = 0.4;       // FDM clearance added per side around the pocket

// ---- Raspberry Pi 5 mounting - VERIFIED against the official Raspberry Pi
// Ltd mechanical drawing (RP-008347-DS-1): 58 x 49mm hole spacing, Ø2.7mm
// holes (clearance for M2.5) ----
pi_hole_x = 58;
pi_hole_y = 49;
pi_hole_d = 2.9;       // add a touch over the datasheet 2.7 for FDM tolerance

// ---- servo horn bolt circle - MEASURED, exact
// Four holes, all on ONE circle of radius 7.000mm (diameter 14.00), at 45,
// 135, 225 and 315 degrees - a square of side 9.90mm. Least-squares circle
// fit to the STEP model's analytic CIRCLE entities, residual 0.000mm.
//
// The earlier "three holes at 6.7, one at 5.6" here was wrong. It came from
// misreading OpenRoboticDog's hip_x4.stl, which has no horn circle at all -
// those were the servo's case screws. See measure/README.md.
horn_bolt_r = 7.0;
horn_bolt_d = 2.7;         // M2.5 clearance, model bore is 2.5
horn_hub_d = 9.2;          // Ø9.0 hub on the horn face, +0.2 clearance

// ---- servo case screw positions - MEASURED
// The four screws that hold the servo case together double as mounting
// points: this is how OpenRoboticDog fixes the servo to its frame, and that
// part measures 3.75mm apart against this model's 3.8mm. Positions are given
// relative to the servo centre, on both flanks at y = +/-10.25.
case_screw_y = 10.25;
case_screw_x = [4.2, -16.5, -20.3];
case_screw_d = 2.2;        // M2 clearance; the servo's own bore is 1.5 pilot

// Two of the three are enough to fix a servo, and OpenRoboticDog uses two.
// Which two matters here: taking the pair NEAREST the output axis keeps a
// mounting pad 35mm long instead of 45mm, which is what lets the trunk frame
// stay inside the 300mm body. The outermost screw stays available if a part
// wants all three.
case_screw_x_used = [4.2, -16.5];

// ---- leg segment spines ----
// The rectangular bar between a segment's two end plates. Declared here
// because FOUR files need it and only agreement makes them fit: the segment
// itself, and the cosmetic fairing that snaps over it. A comment saying
// "must match" is not a mechanism.
thigh_spine = [14, 10];
calf_spine  = [12, 9];

// ---- print structure ----
wall = 4;             // load-bearing wall thickness in PETG
insert_d = 4.2;        // M3 brass heat-set insert bore
insert_depth = 6;
$fn = 48;
// main file
// Segment uda (thigh_link). Runs from the thigh servo's horn (ID2, drives
// this part) to the knee servo's body, bolted on through its own case screws at the far end. 110mm axle-to-axle - VERIFIED, must equal thigh_length in
// leg_ik.py or the gait commands feet the leg cannot reach.
include <params.scad>
include <helpers.scad>

spine_w = thigh_spine[0];
spine_h = thigh_spine[1];

module thigh_segment() {
    union() {
        horn_plate(wall);
        translate([0, 0, thigh_length - wall]) case_plate(wall);
        translate([-spine_w / 2, -spine_h / 2, wall - 1])
            cube([spine_w, spine_h, thigh_length - 2 * wall + 2]);
    }
}

thigh_segment();
